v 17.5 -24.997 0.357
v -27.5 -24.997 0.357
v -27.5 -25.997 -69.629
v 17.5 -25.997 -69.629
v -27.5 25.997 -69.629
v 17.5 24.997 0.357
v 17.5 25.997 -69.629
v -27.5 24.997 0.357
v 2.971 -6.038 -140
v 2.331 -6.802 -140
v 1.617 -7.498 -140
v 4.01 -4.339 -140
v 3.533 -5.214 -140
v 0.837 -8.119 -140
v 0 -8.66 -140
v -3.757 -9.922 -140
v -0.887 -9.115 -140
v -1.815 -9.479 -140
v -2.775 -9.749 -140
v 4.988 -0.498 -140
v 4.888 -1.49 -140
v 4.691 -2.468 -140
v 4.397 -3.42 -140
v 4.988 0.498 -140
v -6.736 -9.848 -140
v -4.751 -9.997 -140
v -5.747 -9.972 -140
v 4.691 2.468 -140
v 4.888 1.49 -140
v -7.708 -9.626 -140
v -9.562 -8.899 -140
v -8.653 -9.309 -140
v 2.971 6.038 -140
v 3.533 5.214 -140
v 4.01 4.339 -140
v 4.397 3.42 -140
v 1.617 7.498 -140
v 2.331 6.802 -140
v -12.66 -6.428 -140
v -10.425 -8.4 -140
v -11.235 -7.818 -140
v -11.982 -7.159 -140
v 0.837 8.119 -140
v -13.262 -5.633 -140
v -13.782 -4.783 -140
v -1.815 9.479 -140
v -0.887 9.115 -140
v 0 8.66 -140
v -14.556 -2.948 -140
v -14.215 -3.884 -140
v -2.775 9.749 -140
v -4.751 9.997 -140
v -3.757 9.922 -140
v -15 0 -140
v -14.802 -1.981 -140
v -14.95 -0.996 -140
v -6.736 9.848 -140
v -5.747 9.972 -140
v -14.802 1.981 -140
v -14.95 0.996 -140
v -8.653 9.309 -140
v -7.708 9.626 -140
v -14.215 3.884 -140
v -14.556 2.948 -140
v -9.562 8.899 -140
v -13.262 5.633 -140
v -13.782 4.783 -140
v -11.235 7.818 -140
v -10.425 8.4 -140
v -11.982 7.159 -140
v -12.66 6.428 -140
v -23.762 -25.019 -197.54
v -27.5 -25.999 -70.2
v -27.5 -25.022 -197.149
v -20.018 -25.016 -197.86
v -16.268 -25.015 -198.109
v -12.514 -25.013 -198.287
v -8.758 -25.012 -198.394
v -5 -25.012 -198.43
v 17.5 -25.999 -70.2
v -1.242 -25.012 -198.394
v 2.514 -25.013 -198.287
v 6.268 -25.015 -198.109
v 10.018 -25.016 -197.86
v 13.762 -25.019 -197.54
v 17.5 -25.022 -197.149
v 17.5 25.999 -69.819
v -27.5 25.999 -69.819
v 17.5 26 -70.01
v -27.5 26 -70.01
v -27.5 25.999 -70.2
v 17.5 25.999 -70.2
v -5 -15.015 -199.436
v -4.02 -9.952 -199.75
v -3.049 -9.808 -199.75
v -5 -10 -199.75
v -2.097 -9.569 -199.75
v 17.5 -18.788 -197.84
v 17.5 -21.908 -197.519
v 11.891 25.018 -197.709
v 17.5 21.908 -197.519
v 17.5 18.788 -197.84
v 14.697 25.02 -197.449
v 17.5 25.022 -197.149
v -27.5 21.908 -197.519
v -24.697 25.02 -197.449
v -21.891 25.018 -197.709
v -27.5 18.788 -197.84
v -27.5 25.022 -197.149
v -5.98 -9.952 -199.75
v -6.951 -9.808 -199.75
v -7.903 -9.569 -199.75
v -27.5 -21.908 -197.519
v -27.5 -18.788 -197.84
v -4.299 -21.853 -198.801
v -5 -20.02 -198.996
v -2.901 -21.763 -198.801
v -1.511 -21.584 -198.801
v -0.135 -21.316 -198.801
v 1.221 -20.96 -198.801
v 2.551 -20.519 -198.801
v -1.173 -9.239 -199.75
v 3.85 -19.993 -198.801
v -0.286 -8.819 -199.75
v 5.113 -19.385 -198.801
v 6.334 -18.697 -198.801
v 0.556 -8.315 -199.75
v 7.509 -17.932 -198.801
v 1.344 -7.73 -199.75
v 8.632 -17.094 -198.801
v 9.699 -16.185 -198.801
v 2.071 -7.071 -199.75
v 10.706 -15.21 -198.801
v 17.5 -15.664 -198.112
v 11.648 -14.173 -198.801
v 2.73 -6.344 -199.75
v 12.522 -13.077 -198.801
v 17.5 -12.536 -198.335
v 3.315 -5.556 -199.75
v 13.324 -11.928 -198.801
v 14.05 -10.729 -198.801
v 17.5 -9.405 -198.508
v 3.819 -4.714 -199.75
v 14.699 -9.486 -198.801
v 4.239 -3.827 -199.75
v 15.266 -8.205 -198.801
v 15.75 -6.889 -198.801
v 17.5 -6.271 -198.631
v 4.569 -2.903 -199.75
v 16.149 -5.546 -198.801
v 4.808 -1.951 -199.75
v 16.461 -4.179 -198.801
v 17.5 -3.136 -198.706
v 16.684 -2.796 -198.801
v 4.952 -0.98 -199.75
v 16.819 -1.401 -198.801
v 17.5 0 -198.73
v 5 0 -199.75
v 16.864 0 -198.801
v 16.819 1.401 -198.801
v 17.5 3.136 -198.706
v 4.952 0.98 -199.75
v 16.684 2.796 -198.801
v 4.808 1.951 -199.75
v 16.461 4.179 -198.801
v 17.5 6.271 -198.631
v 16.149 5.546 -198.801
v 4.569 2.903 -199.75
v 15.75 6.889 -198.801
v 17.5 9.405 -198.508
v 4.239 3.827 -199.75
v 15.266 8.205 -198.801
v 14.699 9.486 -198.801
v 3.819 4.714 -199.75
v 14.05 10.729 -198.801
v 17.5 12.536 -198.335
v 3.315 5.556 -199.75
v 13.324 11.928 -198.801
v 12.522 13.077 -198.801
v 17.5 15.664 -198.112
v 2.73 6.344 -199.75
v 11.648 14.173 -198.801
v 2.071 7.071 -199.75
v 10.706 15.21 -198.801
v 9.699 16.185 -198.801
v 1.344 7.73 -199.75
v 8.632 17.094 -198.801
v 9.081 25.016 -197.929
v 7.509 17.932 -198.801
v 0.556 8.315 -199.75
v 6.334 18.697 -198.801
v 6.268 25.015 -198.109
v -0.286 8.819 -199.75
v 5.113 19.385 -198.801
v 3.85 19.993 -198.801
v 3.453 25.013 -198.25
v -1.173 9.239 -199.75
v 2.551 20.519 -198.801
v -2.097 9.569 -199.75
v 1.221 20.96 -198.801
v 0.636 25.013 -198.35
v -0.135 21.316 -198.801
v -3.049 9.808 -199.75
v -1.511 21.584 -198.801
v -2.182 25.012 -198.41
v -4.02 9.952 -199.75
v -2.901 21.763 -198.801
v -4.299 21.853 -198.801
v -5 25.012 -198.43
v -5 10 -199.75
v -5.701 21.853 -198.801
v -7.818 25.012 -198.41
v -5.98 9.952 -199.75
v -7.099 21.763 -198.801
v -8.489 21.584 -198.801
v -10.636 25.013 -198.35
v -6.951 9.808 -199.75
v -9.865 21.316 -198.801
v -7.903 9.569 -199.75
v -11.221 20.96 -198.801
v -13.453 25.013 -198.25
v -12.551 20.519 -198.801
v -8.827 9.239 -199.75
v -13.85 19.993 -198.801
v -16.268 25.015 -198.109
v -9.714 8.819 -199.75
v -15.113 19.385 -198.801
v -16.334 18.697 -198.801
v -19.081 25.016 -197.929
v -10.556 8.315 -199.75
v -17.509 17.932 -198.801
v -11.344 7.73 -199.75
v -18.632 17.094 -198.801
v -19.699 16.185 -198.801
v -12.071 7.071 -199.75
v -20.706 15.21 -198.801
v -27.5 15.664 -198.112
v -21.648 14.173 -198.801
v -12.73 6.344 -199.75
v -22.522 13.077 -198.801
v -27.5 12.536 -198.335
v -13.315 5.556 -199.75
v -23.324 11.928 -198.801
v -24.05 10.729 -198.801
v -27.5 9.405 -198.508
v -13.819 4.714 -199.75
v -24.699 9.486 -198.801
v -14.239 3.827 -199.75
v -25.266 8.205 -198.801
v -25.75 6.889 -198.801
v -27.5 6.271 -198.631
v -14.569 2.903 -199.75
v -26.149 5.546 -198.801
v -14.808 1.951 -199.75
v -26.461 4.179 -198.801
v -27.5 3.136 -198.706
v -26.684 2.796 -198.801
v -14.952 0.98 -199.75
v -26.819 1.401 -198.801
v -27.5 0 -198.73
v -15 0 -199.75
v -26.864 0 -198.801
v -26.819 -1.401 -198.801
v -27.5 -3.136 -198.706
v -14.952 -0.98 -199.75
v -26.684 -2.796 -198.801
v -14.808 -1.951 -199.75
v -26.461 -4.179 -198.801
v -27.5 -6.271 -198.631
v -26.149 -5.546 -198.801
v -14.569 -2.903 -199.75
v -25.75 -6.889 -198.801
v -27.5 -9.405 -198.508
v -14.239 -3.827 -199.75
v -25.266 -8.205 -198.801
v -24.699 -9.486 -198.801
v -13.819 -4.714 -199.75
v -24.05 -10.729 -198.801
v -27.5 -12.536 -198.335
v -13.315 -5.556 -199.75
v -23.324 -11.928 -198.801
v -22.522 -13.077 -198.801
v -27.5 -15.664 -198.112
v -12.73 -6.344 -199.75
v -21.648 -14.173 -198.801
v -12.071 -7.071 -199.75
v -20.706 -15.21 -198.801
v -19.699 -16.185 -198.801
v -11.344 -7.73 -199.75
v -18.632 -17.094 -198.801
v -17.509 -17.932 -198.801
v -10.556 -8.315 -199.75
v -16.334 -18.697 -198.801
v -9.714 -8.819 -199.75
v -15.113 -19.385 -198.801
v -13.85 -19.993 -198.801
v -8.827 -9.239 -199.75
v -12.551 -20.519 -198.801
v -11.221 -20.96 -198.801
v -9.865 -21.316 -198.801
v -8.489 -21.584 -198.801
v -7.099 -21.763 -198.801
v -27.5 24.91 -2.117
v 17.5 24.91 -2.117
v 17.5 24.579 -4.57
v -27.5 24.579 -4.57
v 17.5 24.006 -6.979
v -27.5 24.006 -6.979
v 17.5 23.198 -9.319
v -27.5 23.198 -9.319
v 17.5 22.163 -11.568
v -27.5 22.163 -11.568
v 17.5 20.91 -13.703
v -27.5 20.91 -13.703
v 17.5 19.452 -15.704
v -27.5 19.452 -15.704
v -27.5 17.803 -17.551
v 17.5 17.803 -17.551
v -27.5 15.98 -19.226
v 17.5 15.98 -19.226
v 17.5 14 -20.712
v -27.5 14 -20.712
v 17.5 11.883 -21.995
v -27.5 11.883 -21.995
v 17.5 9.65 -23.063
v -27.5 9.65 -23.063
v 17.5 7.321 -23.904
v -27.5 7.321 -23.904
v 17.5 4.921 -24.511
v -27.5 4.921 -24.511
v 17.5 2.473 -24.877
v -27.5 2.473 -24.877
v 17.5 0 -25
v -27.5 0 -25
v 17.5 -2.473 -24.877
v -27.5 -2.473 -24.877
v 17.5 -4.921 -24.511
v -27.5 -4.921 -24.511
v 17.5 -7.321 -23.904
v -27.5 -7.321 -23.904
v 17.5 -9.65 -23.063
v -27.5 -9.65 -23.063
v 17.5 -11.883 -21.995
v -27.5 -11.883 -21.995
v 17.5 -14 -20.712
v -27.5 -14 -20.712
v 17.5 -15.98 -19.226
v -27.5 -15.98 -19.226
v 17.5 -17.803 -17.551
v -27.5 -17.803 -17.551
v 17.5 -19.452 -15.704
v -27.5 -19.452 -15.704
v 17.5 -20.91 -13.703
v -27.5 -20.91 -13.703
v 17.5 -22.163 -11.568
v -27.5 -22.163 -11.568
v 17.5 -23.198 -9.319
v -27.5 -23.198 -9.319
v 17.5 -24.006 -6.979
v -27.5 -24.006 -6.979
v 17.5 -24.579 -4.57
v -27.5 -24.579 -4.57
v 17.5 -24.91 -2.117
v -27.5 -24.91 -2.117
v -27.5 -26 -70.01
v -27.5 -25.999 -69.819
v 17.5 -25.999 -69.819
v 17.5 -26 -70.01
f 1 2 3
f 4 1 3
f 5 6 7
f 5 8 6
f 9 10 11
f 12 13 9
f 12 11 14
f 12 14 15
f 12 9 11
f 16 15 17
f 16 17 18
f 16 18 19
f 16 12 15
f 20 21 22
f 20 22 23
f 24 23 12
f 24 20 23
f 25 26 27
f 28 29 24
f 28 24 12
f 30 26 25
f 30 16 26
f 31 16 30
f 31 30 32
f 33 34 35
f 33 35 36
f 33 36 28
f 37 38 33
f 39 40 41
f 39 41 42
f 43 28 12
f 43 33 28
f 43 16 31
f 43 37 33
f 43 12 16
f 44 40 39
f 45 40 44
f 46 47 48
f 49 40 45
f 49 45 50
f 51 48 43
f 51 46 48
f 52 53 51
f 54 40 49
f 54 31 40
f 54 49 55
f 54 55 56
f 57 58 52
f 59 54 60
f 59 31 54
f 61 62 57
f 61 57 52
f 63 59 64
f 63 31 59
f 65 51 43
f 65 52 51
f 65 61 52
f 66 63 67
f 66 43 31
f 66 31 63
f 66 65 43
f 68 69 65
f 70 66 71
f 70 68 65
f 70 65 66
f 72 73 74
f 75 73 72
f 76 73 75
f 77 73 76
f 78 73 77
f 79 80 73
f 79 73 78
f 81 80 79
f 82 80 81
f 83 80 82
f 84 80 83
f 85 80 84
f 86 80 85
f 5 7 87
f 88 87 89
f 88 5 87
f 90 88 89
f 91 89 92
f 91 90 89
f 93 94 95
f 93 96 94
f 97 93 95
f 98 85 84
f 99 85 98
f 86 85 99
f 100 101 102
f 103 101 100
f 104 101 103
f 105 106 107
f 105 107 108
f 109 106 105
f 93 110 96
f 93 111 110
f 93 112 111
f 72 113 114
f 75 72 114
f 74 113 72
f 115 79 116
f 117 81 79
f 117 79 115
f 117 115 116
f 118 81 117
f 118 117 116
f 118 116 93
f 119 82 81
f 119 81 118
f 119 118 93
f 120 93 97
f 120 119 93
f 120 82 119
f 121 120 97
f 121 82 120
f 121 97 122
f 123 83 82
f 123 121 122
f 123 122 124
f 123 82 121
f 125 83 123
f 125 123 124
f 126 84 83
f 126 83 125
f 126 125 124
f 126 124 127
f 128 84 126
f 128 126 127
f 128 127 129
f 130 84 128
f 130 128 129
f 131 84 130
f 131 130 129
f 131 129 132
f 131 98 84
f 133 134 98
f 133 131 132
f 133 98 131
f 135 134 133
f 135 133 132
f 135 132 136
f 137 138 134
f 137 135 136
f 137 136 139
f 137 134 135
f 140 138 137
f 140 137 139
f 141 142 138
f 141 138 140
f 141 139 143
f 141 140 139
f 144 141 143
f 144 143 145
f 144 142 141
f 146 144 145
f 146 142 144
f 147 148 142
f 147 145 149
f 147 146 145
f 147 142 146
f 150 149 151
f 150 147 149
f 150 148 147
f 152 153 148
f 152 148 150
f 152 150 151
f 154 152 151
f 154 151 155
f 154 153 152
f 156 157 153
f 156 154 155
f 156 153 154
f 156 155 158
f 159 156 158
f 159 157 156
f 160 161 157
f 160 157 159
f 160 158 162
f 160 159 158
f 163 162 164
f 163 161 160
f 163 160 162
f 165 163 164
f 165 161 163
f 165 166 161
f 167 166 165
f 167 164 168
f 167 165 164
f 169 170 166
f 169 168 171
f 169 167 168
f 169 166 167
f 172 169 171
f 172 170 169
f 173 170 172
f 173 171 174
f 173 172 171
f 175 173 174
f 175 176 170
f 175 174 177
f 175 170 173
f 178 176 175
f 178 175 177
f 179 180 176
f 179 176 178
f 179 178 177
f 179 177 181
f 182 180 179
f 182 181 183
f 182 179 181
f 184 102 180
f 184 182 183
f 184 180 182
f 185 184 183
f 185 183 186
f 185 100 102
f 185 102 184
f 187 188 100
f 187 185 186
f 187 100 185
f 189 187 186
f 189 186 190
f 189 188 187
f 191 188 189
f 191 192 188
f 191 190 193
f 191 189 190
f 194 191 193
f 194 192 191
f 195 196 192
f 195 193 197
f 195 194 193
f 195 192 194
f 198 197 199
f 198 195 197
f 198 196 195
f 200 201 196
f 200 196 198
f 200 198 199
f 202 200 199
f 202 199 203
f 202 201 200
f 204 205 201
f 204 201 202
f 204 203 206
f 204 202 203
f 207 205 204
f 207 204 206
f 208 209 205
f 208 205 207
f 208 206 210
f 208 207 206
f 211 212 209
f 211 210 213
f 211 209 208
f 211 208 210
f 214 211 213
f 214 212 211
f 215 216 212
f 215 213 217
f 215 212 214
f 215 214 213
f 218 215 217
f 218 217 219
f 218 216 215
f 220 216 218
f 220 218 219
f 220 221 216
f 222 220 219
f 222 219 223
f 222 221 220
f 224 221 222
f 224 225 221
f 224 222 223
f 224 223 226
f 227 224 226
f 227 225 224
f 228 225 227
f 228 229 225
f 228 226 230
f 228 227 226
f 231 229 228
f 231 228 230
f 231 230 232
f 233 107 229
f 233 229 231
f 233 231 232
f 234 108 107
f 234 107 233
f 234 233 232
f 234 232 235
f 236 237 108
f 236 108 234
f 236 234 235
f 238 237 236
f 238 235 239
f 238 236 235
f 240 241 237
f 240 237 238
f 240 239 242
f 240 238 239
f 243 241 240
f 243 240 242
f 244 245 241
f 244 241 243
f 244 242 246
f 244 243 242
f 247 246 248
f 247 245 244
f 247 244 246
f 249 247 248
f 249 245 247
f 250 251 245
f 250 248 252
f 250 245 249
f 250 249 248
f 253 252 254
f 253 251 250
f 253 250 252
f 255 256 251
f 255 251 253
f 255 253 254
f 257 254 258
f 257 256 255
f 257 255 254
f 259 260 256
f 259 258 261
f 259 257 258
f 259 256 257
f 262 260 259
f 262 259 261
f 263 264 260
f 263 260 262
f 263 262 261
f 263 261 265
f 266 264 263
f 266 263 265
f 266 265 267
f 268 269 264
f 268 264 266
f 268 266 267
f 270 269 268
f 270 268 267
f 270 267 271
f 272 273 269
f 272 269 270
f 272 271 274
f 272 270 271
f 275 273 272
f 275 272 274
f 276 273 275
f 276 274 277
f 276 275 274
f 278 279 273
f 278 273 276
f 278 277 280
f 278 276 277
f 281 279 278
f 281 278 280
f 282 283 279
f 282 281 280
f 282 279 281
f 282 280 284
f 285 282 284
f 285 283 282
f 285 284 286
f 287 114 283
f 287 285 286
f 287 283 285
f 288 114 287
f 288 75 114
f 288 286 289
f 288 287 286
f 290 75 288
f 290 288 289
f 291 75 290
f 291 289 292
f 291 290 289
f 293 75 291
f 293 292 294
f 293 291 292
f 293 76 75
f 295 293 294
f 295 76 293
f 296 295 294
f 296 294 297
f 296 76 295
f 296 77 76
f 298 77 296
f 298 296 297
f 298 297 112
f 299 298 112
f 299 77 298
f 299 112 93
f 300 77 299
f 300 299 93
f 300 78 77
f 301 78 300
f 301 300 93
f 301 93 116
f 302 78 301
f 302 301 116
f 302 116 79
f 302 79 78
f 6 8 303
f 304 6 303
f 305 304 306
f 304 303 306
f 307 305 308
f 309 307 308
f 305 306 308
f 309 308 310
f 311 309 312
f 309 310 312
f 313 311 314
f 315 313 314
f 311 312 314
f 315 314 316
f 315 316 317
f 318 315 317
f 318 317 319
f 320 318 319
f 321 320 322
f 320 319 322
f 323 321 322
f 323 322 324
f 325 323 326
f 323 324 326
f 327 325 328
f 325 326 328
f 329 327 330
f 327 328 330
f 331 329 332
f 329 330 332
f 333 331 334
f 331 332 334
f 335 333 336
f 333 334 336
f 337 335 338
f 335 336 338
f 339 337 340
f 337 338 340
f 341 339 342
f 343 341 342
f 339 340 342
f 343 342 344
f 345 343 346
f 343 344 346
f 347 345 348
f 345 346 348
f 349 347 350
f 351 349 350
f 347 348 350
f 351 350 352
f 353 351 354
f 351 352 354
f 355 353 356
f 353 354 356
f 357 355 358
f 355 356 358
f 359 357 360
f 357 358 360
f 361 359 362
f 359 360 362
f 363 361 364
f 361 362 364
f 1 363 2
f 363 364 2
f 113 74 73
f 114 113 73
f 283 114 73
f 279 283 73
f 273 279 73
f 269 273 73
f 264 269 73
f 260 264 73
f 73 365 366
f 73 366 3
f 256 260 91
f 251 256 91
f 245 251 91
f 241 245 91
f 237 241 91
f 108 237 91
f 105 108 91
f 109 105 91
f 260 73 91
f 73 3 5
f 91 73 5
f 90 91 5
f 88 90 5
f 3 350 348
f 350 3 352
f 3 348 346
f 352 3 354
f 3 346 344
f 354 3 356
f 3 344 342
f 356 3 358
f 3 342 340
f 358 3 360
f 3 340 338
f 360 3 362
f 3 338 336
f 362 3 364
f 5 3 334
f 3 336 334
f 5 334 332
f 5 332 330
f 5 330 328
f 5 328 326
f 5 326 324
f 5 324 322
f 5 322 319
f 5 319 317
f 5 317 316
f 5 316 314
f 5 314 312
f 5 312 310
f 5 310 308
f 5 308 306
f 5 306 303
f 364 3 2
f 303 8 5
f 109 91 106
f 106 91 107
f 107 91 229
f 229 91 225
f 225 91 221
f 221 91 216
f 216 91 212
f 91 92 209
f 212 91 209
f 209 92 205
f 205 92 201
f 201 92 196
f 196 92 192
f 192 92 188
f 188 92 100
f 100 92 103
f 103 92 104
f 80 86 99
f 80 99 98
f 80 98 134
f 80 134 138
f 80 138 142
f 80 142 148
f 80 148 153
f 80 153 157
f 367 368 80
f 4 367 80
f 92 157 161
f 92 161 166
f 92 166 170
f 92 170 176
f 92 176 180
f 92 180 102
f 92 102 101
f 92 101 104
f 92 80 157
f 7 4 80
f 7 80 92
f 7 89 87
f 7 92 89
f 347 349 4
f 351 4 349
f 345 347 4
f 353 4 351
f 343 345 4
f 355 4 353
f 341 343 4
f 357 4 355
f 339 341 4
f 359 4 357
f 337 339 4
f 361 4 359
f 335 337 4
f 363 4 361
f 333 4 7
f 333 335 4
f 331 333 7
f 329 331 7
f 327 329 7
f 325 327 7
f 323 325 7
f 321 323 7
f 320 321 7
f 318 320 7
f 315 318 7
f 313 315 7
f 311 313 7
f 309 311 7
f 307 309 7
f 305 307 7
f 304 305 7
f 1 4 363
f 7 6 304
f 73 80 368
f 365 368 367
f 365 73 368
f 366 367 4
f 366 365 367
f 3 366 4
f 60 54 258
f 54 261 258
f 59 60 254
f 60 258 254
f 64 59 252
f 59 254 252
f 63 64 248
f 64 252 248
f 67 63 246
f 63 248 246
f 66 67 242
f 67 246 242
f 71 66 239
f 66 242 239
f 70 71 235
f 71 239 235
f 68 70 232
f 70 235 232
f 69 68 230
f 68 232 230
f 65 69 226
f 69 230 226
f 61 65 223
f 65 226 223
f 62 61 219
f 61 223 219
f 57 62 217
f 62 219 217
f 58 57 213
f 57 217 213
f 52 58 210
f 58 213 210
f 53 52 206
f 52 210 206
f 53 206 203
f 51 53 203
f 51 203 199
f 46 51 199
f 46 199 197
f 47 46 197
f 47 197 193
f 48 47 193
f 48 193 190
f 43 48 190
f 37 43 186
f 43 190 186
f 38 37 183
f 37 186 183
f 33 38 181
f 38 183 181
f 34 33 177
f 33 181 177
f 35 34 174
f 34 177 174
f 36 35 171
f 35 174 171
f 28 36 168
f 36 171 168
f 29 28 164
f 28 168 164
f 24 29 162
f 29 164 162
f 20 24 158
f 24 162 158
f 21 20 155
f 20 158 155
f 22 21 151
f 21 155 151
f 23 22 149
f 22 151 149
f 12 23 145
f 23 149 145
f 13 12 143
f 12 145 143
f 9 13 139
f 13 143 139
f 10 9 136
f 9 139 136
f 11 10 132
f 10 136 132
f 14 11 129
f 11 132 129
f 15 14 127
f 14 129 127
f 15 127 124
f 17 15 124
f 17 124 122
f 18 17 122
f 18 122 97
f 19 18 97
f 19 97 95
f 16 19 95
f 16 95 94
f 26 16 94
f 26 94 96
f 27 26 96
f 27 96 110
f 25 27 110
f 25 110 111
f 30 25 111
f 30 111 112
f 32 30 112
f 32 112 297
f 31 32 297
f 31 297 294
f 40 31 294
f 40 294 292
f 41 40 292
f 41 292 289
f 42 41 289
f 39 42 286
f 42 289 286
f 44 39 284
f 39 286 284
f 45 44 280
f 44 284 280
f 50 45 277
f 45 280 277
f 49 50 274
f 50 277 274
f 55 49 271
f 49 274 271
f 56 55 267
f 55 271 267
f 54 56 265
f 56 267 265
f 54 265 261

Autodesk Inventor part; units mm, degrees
ref_plane "YZ Plane" through (0, 0, 0) normal (1, 0, 0) x (0, 1, 0)
ref_plane "XY Plane" through (0, 0, 0) normal (0, 0, 1) x (1, 0, 0)
ref_plane "UCS1: YZ Plane" through (0, 0, 0) normal (1, 0, 0) x (0, 1, 0)
sketch "Sketch2" plane through (0, 0, 0) normal (1, 0, 0) x (0, 1, 0)
  circle A0 centre (0, -70) radius 26
  line L0 (25, -200) -> (-25, -200)
  line L1 (0, -70) -> (0, -200) construction
  line L2 (-25.9992, -70.2001) -> (-25, -200)
  line L3 (25.9992, -70.2001) -> (25, -200)
  circle A1 centre (0, 0) radius 25
  line L4 (-24.9974, 0.3571) -> (-25.9973, -69.6286)
  line L5 (24.9974, 0.3571) -> (25.9973, -69.6286)
  point P0 (25, 0)
  point P1 (-25, 0)
  dimension "d1" = 52
  dimension "d3" = 50
  dimension "d25" = 130
  dimension "d26" = 50
  dimension "d33" = 70
extrude "Extrusion1" add sketch "Sketch2" along normal blind 17.5 and the other way blind 27.5 contours A0
extrude "Extrusion2" add sketch "Sketch2" against normal blind 45 from surface at 17.5 contours L3 L0 L2 A0
sketch "Sketch5" plane through (17.5, -25, -200) normal (0, 0, -1) x (-1, 0, 0)
  circle A0 centre (22.5, 25) radius 10
  line L0 (45, 50) -> (45, 0) projected
  line L1 (45, 50) -> (0, 50) projected
  point P0 (17.5, 25)
  point P1 (45, 25)
  point P2 (-45, 0)
  point P3 (22.5, 50)
  dimension "d22" = 20
extrude "Extrusion4" cut sketch "Sketch5" against normal blind 60
ref_plane "Work Plane1" through (-5, 0, -70) normal (-1, 0, 0) x (0, 0, -1)
sketch "Sketch4" plane through (-5, 0, -70) normal (-1, 0, 0) x (0, 0, -1)
  circle A0 centre (-70, 0) radius 200
  line L0 (130, -25) -> (130, 25) projected
  line L1 (-270, 0) -> (130, 0)
  line L2 (130, 0) -> (130, 25)
  line L3 (130, 25) -> (0.2001, 25.9992) projected
  line L4 (130, 25) -> (130.19, 49.679)
  line L5 (130.19, 49.679) -> (123.719, 49.7288)
  point P0 (128.4298, 25.0121)
  point P1 (130, 0)
revolve "Revolution1" cut sketch "Sketch4" angle 360 about axis through (-5, 0, 200) along (0, 0, -1) contours L5 L4 L3 A0 | L3 L0 A0
extrude "Extrusion5" add sketch "Sketch2" along normal blind 17.5 and the other way blind 27.5 contours A0 L4 A1 L5
properties part number "shank_inventor"
